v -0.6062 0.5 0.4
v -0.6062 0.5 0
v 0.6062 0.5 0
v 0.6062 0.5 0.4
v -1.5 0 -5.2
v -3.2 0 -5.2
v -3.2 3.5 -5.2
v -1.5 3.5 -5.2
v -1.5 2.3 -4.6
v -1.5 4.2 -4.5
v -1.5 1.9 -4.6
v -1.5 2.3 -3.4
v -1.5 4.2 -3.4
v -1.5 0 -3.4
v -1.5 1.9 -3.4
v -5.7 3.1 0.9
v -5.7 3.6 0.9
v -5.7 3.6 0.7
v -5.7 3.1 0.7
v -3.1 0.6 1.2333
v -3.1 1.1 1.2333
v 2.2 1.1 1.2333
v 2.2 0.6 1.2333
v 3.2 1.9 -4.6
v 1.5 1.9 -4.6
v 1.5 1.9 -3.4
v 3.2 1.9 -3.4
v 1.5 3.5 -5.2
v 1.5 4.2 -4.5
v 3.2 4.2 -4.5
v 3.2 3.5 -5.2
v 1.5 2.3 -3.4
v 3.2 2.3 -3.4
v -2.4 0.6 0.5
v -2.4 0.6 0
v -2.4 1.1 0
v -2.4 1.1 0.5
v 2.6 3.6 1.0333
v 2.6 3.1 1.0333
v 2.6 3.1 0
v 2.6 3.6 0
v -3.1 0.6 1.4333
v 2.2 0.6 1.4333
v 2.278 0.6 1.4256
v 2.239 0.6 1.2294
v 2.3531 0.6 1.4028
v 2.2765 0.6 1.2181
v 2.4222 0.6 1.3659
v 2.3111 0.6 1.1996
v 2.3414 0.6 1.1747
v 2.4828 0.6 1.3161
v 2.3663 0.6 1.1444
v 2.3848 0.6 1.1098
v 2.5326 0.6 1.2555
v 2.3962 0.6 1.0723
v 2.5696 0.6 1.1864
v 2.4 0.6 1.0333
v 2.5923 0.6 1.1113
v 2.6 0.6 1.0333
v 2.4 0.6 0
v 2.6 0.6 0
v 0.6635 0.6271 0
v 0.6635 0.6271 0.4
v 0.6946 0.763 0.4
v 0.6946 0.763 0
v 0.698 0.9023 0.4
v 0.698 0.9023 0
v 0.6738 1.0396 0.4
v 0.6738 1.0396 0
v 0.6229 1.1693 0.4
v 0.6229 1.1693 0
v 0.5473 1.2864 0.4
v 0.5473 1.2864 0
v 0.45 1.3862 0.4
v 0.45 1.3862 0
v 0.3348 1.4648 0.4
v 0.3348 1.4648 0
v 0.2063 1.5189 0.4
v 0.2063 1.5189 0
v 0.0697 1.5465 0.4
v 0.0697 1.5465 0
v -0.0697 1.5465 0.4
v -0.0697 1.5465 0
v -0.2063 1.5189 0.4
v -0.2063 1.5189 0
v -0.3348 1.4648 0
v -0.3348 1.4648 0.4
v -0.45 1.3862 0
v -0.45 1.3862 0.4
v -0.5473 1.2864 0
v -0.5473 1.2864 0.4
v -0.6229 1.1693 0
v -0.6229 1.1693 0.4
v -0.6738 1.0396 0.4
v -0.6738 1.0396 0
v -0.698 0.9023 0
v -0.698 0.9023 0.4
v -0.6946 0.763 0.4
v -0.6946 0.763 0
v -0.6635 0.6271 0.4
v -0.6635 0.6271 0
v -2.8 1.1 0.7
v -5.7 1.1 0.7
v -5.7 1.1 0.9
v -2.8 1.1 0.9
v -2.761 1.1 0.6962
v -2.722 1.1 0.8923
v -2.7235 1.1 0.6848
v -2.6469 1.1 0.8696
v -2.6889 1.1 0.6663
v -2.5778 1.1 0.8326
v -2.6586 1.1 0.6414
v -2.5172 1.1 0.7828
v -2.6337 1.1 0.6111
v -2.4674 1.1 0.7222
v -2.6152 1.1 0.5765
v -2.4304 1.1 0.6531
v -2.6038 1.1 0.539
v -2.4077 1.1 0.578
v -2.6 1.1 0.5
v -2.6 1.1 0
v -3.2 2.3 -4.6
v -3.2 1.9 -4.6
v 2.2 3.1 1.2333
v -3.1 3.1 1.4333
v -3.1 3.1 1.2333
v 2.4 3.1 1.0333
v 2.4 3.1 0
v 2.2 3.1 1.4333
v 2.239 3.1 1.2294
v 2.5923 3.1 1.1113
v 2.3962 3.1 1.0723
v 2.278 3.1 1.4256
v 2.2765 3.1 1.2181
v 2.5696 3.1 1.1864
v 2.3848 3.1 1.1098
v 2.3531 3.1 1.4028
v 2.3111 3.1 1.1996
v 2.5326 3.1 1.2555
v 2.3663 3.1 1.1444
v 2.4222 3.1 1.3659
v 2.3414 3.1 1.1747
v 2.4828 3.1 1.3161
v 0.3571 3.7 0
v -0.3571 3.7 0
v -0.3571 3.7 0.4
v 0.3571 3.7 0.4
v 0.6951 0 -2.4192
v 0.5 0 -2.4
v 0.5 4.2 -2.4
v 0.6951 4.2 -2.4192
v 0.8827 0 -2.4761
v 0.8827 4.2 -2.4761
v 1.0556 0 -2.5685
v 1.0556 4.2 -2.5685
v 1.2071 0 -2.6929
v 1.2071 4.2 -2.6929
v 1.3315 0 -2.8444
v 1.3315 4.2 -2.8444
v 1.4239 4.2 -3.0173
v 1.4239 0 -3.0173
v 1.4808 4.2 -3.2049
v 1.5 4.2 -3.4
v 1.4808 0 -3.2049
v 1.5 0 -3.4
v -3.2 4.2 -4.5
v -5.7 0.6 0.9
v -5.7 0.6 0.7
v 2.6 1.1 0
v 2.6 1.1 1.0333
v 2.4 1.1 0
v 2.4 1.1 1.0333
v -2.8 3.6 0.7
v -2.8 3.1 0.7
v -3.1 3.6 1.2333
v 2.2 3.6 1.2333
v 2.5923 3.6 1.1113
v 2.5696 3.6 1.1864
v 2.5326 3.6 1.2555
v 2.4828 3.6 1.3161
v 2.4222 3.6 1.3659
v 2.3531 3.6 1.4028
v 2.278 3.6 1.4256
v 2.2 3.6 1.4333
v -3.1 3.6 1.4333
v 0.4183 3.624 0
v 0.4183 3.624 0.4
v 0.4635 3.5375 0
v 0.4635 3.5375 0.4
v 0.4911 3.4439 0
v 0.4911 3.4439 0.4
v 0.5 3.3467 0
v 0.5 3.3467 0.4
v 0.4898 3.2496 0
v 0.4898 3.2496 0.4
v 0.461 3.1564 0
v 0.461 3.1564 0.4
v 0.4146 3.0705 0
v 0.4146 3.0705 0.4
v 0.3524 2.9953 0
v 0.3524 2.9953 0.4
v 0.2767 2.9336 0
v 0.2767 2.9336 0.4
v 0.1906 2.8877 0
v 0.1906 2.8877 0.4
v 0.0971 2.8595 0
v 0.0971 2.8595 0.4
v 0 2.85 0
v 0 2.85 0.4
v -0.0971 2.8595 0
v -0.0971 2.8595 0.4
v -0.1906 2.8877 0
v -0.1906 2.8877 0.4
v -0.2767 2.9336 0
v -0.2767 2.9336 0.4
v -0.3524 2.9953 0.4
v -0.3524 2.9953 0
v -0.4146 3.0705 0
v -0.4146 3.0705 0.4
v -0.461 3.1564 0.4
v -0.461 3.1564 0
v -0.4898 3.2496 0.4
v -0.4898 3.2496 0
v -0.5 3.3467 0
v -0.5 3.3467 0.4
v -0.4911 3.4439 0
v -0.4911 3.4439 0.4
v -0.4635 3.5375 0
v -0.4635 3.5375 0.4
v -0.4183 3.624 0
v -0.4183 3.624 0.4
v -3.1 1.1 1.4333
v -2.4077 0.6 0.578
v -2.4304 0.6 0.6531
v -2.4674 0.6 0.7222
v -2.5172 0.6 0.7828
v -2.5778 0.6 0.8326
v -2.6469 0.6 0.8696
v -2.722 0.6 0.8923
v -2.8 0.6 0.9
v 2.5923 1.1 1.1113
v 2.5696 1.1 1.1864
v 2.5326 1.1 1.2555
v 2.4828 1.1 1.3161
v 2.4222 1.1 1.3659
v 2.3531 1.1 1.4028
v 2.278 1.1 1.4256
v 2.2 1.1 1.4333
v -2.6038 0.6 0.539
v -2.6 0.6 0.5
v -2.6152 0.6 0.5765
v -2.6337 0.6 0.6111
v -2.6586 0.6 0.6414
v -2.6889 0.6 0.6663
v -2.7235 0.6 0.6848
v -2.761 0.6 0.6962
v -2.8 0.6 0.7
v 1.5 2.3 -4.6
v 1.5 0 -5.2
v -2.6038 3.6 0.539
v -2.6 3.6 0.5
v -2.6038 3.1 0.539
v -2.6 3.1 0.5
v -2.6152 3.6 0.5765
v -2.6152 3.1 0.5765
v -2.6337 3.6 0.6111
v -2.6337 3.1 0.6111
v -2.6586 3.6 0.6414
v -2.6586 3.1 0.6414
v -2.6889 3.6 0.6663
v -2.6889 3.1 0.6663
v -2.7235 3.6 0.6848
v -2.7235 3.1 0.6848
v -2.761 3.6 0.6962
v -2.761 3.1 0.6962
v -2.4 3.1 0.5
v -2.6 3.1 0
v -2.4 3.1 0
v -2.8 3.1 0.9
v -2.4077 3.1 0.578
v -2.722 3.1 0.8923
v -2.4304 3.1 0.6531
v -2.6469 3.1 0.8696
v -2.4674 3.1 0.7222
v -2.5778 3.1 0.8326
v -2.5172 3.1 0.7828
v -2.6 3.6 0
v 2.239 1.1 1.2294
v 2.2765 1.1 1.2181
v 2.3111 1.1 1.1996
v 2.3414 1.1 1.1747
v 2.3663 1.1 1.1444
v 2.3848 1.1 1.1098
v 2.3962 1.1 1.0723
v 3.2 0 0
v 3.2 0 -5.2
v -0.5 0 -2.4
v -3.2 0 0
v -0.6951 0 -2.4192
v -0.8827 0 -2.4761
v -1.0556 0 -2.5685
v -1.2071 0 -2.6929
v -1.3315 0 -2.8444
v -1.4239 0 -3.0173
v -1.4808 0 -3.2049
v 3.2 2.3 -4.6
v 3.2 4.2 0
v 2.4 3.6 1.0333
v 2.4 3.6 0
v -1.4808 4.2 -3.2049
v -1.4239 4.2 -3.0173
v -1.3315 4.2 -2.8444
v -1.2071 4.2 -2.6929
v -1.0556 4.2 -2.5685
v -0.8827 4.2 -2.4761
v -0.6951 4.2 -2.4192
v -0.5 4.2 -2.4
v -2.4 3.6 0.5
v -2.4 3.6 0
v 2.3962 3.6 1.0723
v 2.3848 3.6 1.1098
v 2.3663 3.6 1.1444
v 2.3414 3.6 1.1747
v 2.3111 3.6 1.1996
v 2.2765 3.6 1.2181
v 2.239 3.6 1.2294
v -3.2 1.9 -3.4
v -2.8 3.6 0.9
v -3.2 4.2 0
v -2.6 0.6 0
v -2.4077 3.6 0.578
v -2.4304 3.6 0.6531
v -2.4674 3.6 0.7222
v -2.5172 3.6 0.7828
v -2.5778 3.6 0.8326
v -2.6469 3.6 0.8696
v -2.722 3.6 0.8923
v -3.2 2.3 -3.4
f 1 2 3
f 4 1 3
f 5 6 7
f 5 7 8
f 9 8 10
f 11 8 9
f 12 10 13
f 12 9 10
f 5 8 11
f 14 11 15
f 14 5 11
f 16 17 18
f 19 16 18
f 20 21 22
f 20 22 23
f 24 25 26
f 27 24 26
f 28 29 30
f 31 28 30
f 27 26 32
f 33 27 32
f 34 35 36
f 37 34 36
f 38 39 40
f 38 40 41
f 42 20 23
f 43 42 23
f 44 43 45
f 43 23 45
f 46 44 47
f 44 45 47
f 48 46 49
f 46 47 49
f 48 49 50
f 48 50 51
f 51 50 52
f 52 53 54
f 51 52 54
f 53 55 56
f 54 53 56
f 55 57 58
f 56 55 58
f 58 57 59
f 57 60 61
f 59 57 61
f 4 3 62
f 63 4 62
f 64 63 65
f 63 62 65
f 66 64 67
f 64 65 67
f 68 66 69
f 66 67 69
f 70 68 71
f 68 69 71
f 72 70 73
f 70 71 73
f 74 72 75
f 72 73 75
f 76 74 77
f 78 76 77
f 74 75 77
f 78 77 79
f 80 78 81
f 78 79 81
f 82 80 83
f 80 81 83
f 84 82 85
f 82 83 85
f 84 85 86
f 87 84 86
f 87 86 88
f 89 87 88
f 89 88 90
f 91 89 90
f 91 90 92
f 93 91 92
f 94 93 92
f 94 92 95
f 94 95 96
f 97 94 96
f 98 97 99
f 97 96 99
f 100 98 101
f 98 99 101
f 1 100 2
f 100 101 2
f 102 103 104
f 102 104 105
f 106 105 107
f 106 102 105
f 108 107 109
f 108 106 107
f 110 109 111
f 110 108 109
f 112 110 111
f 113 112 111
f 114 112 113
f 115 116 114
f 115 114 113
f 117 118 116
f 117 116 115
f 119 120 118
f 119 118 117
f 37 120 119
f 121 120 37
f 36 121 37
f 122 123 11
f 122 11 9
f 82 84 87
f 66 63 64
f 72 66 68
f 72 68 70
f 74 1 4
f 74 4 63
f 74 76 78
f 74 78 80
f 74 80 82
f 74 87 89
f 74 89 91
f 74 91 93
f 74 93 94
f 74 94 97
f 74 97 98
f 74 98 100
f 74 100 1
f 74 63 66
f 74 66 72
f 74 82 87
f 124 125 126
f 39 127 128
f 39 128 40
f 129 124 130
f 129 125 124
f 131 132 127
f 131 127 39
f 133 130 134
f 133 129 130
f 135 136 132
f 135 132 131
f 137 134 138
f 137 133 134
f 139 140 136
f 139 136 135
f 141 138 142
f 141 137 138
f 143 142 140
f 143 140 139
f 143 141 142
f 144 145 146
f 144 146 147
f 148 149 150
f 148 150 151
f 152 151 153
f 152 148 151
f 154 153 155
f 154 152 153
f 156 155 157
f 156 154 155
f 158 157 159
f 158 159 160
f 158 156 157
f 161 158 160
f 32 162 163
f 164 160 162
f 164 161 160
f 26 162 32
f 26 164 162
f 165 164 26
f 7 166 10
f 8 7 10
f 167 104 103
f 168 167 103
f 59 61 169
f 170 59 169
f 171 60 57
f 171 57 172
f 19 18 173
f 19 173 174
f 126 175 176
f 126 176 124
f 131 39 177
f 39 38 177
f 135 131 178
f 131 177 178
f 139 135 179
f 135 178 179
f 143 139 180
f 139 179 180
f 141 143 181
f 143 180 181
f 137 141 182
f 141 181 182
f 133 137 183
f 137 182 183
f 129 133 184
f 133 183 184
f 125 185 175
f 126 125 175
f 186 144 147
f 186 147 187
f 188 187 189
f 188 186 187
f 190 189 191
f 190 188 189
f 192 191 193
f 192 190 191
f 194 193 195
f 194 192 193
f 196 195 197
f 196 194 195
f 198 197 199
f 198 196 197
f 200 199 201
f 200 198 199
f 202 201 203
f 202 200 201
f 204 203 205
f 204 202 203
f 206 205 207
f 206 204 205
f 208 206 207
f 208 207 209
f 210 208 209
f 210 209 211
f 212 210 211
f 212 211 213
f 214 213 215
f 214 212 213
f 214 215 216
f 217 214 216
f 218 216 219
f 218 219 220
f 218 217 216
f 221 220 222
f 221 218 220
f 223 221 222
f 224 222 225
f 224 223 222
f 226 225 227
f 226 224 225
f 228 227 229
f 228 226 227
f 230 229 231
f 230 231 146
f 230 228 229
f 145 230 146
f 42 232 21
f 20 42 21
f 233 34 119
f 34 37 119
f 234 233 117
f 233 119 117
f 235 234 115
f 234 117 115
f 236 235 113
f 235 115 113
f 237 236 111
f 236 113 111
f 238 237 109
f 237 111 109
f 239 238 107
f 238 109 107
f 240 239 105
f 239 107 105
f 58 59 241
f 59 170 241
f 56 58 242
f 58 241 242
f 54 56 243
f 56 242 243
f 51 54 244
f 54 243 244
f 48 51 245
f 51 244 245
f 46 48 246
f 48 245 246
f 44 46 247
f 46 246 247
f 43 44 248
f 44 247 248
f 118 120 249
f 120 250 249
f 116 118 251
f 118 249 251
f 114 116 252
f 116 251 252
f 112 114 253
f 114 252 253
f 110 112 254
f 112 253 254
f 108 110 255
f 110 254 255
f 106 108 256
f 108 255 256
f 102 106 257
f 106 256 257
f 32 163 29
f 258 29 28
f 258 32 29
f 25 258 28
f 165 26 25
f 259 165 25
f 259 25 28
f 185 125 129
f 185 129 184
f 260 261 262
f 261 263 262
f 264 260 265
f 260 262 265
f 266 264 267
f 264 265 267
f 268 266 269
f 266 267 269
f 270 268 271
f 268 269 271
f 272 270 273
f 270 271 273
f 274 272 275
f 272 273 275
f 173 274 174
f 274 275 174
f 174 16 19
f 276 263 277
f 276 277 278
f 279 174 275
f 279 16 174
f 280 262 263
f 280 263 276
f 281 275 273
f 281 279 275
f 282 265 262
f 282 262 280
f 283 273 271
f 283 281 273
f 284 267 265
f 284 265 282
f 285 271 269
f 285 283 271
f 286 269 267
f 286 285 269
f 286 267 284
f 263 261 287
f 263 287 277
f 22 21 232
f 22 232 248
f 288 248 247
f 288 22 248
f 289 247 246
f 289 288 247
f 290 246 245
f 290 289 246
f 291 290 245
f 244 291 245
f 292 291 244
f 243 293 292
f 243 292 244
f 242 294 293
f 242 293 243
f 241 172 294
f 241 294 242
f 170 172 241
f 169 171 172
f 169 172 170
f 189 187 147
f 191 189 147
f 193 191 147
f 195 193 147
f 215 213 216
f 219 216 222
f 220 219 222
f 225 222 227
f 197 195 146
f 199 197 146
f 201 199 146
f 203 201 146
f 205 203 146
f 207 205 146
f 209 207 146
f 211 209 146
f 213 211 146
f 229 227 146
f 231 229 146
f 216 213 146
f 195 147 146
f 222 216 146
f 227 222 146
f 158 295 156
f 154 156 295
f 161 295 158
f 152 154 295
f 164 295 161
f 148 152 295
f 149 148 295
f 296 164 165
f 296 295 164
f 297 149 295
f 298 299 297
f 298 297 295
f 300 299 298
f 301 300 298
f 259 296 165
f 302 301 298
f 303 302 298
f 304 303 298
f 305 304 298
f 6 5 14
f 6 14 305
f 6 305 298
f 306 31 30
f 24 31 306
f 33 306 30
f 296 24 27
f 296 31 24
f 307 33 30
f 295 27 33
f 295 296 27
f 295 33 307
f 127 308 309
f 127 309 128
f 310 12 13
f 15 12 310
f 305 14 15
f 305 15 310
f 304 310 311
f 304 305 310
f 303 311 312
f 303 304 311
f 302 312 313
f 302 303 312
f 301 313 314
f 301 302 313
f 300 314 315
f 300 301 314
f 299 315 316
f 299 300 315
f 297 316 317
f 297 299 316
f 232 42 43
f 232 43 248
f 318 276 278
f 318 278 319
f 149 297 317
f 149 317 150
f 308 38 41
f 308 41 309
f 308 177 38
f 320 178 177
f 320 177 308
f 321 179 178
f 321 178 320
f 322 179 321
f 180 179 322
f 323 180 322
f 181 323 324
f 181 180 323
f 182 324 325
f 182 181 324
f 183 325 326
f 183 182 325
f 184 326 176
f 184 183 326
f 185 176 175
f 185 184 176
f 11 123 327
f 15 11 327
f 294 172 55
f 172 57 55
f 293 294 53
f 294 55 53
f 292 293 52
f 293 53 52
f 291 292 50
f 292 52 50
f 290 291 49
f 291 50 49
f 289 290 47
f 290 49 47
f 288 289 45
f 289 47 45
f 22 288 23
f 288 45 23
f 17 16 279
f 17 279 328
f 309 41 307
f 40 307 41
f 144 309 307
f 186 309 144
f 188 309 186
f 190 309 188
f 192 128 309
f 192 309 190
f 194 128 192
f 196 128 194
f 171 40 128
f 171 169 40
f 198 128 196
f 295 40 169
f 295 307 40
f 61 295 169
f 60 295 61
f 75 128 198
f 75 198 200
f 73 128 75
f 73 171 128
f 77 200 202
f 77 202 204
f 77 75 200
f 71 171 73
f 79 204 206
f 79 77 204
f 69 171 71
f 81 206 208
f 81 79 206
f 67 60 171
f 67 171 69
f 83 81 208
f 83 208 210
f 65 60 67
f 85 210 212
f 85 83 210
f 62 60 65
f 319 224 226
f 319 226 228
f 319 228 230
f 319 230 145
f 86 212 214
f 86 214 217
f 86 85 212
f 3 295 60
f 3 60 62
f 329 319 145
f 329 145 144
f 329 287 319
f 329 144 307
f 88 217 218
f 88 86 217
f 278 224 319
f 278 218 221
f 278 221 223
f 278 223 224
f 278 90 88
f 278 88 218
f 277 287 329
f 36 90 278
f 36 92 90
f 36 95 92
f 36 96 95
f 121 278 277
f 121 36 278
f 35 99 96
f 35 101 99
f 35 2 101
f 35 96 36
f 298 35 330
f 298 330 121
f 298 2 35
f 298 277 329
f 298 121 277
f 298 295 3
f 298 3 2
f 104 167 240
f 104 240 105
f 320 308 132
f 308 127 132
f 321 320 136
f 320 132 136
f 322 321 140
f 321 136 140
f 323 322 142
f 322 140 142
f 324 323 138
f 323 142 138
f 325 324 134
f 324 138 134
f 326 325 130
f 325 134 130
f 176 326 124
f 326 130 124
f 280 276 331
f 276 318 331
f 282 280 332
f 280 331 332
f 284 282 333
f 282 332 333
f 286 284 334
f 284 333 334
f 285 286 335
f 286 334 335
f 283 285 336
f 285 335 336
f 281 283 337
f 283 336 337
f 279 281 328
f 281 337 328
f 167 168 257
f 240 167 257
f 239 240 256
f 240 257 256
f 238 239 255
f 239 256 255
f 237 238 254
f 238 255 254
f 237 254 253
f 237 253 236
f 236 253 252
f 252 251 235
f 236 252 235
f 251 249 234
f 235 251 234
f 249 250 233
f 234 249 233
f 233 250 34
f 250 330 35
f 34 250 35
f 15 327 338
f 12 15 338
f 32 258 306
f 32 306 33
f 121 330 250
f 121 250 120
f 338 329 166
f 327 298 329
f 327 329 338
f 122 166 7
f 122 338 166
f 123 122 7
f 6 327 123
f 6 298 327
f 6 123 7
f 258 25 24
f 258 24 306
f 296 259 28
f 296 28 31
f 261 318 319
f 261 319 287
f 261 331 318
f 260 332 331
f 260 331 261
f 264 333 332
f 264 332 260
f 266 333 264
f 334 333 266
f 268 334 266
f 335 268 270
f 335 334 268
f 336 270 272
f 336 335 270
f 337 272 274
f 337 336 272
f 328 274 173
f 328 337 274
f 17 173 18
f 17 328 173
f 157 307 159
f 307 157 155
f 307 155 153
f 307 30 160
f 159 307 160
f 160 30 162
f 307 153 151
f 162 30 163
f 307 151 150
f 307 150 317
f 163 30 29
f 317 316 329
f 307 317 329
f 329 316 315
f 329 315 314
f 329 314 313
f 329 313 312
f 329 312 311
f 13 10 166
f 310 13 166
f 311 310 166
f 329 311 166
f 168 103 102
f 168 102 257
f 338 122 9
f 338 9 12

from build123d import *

# Parameters (mm, degrees)
EXTRUDE_1_DEPTH     = 4.2
CHAMFER_1_SIZE      = 0.7
SKETCH_2_W          = 1.2
SKETCH_2_H          = 0.4
CUT_EXTRUDE_1_DEPTH = 7.4
SKETCH_3_W          = 0.2
SKETCH_3_H          = 0.5
EXTRUDE_2_DEPTH     = 0.4
SKETCH_4_W          = 0.2
SKETCH_4_H          = 0.5
SKETCH_5_W          = 0.2
SKETCH_5_H          = 0.5


with BuildPart() as part:
    # Эскиз1 → Бобышка-Вытянуть1 (new body)
    with BuildSketch(Plane(origin=(0, 0, 0), x_dir=(1, 0, 0), z_dir=(0, 1, 0))):
        with BuildLine():
            Line((-3.2, 0), (-3.2, 5.2))
            Line((-3.2, 5.2), (-1.5, 5.2))
            Line((-1.5, 5.2), (-1.5, 3.4))
            ThreePointArc((-1.5, 3.4), (-1.207106781, 2.692893219), (-0.5, 2.4))
            Line((-0.5, 2.4), (0.5, 2.4))
            ThreePointArc((0.5, 2.4), (1.207106781, 2.692893219), (1.5, 3.4))
            Line((1.5, 3.4), (1.5, 5.2))
            Line((1.5, 5.2), (3.2, 5.2))
            Line((3.2, 5.2), (3.2, 0))
            Line((3.2, 0), (-3.2, 0))
        make_face()
    extrude(amount=EXTRUDE_1_DEPTH)

    # Фаска1
    chamfer_1_edges = [part.edges().sort_by_distance(p)[0] for p in [
        (2.35, 4.2, -5.2),
        (-2.35, 4.2, -5.2),
    ]]
    chamfer(chamfer_1_edges, length=CHAMFER_1_SIZE)

    # Эскиз2 → Вырез-Вытянуть1 (cut, through all)
    with BuildSketch(Plane.ZY.offset(3.2)):
        with Locations((-4, 2.1)):
            Rectangle(SKETCH_2_W, SKETCH_2_H)
    extrude(amount=-CUT_EXTRUDE_1_DEPTH, mode=Mode.SUBTRACT)

    # Эскиз3 → Бобышка-Вытянуть2 (add)
    with BuildSketch(Plane.XY):
        with BuildLine():
            Line((-0.357071421, 3.7), (0.357071421, 3.7))
            ThreePointArc((0.357071421, 3.7), (0, 2.85), (-0.357071421, 3.7))
        make_face()
        with BuildLine():
            Line((-0.606217783, 0.5), (0.606217783, 0.5))
            ThreePointArc((0.606217783, 0.5), (0, 1.55), (-0.606217783, 0.5))
        make_face()
        with Locations((-2.5, 3.35)):
            Rectangle(SKETCH_3_W, SKETCH_3_H)
        with Locations((2.5, 3.35)):
            Rectangle(SKETCH_3_W, SKETCH_3_H)
        with Locations((2.5, 0.85)):
            Rectangle(SKETCH_3_W, SKETCH_3_H)
        with Locations((-2.5, 0.85)):
            Rectangle(SKETCH_3_W, SKETCH_3_H)
    extrude(amount=EXTRUDE_2_DEPTH)

    # По траектории1: sweep along a curve in space
    with BuildLine() as sweep_1_path:
        Line((2.4, 3.1, 0.4), (2.4, 3.1, 1.033279954))
        ThreePointArc((2.2, 3.1, 1.233279954), (2.341421356, 3.1, 1.17470131), (2.4, 3.1, 1.033279954))
        Line((2.2, 3.1, 1.233279954), (-3.1, 3.1, 1.233279954))
    # Эскиз4 → По траектории1 (sweep)
    with BuildSketch(Plane.XY.offset(0.4)):
        with Locations((2.5, 3.35)):
            Rectangle(SKETCH_4_W, SKETCH_4_H)
        with Locations((2.5, 0.85)):
            Rectangle(SKETCH_4_W, SKETCH_4_H)
    sweep(path=sweep_1_path.line)

    # По траектории2: sweep along a curve in space
    with BuildLine() as sweep_2_path:
        Line((-2.6, 0.6, 0.4), (-2.6, 0.6, 0.5))
        ThreePointArc((-2.8, 0.6, 0.7), (-2.658578644, 0.6, 0.641421356), (-2.6, 0.6, 0.5))
        Line((-2.8, 0.6, 0.7), (-5.7, 0.6, 0.7))
    # Эскиз5 → По траектории2 (sweep)
    with BuildSketch(Plane.XY.offset(0.4)):
        with Locations((-2.5, 3.35)):
            Rectangle(SKETCH_5_W, SKETCH_5_H)
        with Locations((-2.5, 0.85)):
            Rectangle(SKETCH_5_W, SKETCH_5_H)
    sweep(path=sweep_2_path.line)


solid = part.part
